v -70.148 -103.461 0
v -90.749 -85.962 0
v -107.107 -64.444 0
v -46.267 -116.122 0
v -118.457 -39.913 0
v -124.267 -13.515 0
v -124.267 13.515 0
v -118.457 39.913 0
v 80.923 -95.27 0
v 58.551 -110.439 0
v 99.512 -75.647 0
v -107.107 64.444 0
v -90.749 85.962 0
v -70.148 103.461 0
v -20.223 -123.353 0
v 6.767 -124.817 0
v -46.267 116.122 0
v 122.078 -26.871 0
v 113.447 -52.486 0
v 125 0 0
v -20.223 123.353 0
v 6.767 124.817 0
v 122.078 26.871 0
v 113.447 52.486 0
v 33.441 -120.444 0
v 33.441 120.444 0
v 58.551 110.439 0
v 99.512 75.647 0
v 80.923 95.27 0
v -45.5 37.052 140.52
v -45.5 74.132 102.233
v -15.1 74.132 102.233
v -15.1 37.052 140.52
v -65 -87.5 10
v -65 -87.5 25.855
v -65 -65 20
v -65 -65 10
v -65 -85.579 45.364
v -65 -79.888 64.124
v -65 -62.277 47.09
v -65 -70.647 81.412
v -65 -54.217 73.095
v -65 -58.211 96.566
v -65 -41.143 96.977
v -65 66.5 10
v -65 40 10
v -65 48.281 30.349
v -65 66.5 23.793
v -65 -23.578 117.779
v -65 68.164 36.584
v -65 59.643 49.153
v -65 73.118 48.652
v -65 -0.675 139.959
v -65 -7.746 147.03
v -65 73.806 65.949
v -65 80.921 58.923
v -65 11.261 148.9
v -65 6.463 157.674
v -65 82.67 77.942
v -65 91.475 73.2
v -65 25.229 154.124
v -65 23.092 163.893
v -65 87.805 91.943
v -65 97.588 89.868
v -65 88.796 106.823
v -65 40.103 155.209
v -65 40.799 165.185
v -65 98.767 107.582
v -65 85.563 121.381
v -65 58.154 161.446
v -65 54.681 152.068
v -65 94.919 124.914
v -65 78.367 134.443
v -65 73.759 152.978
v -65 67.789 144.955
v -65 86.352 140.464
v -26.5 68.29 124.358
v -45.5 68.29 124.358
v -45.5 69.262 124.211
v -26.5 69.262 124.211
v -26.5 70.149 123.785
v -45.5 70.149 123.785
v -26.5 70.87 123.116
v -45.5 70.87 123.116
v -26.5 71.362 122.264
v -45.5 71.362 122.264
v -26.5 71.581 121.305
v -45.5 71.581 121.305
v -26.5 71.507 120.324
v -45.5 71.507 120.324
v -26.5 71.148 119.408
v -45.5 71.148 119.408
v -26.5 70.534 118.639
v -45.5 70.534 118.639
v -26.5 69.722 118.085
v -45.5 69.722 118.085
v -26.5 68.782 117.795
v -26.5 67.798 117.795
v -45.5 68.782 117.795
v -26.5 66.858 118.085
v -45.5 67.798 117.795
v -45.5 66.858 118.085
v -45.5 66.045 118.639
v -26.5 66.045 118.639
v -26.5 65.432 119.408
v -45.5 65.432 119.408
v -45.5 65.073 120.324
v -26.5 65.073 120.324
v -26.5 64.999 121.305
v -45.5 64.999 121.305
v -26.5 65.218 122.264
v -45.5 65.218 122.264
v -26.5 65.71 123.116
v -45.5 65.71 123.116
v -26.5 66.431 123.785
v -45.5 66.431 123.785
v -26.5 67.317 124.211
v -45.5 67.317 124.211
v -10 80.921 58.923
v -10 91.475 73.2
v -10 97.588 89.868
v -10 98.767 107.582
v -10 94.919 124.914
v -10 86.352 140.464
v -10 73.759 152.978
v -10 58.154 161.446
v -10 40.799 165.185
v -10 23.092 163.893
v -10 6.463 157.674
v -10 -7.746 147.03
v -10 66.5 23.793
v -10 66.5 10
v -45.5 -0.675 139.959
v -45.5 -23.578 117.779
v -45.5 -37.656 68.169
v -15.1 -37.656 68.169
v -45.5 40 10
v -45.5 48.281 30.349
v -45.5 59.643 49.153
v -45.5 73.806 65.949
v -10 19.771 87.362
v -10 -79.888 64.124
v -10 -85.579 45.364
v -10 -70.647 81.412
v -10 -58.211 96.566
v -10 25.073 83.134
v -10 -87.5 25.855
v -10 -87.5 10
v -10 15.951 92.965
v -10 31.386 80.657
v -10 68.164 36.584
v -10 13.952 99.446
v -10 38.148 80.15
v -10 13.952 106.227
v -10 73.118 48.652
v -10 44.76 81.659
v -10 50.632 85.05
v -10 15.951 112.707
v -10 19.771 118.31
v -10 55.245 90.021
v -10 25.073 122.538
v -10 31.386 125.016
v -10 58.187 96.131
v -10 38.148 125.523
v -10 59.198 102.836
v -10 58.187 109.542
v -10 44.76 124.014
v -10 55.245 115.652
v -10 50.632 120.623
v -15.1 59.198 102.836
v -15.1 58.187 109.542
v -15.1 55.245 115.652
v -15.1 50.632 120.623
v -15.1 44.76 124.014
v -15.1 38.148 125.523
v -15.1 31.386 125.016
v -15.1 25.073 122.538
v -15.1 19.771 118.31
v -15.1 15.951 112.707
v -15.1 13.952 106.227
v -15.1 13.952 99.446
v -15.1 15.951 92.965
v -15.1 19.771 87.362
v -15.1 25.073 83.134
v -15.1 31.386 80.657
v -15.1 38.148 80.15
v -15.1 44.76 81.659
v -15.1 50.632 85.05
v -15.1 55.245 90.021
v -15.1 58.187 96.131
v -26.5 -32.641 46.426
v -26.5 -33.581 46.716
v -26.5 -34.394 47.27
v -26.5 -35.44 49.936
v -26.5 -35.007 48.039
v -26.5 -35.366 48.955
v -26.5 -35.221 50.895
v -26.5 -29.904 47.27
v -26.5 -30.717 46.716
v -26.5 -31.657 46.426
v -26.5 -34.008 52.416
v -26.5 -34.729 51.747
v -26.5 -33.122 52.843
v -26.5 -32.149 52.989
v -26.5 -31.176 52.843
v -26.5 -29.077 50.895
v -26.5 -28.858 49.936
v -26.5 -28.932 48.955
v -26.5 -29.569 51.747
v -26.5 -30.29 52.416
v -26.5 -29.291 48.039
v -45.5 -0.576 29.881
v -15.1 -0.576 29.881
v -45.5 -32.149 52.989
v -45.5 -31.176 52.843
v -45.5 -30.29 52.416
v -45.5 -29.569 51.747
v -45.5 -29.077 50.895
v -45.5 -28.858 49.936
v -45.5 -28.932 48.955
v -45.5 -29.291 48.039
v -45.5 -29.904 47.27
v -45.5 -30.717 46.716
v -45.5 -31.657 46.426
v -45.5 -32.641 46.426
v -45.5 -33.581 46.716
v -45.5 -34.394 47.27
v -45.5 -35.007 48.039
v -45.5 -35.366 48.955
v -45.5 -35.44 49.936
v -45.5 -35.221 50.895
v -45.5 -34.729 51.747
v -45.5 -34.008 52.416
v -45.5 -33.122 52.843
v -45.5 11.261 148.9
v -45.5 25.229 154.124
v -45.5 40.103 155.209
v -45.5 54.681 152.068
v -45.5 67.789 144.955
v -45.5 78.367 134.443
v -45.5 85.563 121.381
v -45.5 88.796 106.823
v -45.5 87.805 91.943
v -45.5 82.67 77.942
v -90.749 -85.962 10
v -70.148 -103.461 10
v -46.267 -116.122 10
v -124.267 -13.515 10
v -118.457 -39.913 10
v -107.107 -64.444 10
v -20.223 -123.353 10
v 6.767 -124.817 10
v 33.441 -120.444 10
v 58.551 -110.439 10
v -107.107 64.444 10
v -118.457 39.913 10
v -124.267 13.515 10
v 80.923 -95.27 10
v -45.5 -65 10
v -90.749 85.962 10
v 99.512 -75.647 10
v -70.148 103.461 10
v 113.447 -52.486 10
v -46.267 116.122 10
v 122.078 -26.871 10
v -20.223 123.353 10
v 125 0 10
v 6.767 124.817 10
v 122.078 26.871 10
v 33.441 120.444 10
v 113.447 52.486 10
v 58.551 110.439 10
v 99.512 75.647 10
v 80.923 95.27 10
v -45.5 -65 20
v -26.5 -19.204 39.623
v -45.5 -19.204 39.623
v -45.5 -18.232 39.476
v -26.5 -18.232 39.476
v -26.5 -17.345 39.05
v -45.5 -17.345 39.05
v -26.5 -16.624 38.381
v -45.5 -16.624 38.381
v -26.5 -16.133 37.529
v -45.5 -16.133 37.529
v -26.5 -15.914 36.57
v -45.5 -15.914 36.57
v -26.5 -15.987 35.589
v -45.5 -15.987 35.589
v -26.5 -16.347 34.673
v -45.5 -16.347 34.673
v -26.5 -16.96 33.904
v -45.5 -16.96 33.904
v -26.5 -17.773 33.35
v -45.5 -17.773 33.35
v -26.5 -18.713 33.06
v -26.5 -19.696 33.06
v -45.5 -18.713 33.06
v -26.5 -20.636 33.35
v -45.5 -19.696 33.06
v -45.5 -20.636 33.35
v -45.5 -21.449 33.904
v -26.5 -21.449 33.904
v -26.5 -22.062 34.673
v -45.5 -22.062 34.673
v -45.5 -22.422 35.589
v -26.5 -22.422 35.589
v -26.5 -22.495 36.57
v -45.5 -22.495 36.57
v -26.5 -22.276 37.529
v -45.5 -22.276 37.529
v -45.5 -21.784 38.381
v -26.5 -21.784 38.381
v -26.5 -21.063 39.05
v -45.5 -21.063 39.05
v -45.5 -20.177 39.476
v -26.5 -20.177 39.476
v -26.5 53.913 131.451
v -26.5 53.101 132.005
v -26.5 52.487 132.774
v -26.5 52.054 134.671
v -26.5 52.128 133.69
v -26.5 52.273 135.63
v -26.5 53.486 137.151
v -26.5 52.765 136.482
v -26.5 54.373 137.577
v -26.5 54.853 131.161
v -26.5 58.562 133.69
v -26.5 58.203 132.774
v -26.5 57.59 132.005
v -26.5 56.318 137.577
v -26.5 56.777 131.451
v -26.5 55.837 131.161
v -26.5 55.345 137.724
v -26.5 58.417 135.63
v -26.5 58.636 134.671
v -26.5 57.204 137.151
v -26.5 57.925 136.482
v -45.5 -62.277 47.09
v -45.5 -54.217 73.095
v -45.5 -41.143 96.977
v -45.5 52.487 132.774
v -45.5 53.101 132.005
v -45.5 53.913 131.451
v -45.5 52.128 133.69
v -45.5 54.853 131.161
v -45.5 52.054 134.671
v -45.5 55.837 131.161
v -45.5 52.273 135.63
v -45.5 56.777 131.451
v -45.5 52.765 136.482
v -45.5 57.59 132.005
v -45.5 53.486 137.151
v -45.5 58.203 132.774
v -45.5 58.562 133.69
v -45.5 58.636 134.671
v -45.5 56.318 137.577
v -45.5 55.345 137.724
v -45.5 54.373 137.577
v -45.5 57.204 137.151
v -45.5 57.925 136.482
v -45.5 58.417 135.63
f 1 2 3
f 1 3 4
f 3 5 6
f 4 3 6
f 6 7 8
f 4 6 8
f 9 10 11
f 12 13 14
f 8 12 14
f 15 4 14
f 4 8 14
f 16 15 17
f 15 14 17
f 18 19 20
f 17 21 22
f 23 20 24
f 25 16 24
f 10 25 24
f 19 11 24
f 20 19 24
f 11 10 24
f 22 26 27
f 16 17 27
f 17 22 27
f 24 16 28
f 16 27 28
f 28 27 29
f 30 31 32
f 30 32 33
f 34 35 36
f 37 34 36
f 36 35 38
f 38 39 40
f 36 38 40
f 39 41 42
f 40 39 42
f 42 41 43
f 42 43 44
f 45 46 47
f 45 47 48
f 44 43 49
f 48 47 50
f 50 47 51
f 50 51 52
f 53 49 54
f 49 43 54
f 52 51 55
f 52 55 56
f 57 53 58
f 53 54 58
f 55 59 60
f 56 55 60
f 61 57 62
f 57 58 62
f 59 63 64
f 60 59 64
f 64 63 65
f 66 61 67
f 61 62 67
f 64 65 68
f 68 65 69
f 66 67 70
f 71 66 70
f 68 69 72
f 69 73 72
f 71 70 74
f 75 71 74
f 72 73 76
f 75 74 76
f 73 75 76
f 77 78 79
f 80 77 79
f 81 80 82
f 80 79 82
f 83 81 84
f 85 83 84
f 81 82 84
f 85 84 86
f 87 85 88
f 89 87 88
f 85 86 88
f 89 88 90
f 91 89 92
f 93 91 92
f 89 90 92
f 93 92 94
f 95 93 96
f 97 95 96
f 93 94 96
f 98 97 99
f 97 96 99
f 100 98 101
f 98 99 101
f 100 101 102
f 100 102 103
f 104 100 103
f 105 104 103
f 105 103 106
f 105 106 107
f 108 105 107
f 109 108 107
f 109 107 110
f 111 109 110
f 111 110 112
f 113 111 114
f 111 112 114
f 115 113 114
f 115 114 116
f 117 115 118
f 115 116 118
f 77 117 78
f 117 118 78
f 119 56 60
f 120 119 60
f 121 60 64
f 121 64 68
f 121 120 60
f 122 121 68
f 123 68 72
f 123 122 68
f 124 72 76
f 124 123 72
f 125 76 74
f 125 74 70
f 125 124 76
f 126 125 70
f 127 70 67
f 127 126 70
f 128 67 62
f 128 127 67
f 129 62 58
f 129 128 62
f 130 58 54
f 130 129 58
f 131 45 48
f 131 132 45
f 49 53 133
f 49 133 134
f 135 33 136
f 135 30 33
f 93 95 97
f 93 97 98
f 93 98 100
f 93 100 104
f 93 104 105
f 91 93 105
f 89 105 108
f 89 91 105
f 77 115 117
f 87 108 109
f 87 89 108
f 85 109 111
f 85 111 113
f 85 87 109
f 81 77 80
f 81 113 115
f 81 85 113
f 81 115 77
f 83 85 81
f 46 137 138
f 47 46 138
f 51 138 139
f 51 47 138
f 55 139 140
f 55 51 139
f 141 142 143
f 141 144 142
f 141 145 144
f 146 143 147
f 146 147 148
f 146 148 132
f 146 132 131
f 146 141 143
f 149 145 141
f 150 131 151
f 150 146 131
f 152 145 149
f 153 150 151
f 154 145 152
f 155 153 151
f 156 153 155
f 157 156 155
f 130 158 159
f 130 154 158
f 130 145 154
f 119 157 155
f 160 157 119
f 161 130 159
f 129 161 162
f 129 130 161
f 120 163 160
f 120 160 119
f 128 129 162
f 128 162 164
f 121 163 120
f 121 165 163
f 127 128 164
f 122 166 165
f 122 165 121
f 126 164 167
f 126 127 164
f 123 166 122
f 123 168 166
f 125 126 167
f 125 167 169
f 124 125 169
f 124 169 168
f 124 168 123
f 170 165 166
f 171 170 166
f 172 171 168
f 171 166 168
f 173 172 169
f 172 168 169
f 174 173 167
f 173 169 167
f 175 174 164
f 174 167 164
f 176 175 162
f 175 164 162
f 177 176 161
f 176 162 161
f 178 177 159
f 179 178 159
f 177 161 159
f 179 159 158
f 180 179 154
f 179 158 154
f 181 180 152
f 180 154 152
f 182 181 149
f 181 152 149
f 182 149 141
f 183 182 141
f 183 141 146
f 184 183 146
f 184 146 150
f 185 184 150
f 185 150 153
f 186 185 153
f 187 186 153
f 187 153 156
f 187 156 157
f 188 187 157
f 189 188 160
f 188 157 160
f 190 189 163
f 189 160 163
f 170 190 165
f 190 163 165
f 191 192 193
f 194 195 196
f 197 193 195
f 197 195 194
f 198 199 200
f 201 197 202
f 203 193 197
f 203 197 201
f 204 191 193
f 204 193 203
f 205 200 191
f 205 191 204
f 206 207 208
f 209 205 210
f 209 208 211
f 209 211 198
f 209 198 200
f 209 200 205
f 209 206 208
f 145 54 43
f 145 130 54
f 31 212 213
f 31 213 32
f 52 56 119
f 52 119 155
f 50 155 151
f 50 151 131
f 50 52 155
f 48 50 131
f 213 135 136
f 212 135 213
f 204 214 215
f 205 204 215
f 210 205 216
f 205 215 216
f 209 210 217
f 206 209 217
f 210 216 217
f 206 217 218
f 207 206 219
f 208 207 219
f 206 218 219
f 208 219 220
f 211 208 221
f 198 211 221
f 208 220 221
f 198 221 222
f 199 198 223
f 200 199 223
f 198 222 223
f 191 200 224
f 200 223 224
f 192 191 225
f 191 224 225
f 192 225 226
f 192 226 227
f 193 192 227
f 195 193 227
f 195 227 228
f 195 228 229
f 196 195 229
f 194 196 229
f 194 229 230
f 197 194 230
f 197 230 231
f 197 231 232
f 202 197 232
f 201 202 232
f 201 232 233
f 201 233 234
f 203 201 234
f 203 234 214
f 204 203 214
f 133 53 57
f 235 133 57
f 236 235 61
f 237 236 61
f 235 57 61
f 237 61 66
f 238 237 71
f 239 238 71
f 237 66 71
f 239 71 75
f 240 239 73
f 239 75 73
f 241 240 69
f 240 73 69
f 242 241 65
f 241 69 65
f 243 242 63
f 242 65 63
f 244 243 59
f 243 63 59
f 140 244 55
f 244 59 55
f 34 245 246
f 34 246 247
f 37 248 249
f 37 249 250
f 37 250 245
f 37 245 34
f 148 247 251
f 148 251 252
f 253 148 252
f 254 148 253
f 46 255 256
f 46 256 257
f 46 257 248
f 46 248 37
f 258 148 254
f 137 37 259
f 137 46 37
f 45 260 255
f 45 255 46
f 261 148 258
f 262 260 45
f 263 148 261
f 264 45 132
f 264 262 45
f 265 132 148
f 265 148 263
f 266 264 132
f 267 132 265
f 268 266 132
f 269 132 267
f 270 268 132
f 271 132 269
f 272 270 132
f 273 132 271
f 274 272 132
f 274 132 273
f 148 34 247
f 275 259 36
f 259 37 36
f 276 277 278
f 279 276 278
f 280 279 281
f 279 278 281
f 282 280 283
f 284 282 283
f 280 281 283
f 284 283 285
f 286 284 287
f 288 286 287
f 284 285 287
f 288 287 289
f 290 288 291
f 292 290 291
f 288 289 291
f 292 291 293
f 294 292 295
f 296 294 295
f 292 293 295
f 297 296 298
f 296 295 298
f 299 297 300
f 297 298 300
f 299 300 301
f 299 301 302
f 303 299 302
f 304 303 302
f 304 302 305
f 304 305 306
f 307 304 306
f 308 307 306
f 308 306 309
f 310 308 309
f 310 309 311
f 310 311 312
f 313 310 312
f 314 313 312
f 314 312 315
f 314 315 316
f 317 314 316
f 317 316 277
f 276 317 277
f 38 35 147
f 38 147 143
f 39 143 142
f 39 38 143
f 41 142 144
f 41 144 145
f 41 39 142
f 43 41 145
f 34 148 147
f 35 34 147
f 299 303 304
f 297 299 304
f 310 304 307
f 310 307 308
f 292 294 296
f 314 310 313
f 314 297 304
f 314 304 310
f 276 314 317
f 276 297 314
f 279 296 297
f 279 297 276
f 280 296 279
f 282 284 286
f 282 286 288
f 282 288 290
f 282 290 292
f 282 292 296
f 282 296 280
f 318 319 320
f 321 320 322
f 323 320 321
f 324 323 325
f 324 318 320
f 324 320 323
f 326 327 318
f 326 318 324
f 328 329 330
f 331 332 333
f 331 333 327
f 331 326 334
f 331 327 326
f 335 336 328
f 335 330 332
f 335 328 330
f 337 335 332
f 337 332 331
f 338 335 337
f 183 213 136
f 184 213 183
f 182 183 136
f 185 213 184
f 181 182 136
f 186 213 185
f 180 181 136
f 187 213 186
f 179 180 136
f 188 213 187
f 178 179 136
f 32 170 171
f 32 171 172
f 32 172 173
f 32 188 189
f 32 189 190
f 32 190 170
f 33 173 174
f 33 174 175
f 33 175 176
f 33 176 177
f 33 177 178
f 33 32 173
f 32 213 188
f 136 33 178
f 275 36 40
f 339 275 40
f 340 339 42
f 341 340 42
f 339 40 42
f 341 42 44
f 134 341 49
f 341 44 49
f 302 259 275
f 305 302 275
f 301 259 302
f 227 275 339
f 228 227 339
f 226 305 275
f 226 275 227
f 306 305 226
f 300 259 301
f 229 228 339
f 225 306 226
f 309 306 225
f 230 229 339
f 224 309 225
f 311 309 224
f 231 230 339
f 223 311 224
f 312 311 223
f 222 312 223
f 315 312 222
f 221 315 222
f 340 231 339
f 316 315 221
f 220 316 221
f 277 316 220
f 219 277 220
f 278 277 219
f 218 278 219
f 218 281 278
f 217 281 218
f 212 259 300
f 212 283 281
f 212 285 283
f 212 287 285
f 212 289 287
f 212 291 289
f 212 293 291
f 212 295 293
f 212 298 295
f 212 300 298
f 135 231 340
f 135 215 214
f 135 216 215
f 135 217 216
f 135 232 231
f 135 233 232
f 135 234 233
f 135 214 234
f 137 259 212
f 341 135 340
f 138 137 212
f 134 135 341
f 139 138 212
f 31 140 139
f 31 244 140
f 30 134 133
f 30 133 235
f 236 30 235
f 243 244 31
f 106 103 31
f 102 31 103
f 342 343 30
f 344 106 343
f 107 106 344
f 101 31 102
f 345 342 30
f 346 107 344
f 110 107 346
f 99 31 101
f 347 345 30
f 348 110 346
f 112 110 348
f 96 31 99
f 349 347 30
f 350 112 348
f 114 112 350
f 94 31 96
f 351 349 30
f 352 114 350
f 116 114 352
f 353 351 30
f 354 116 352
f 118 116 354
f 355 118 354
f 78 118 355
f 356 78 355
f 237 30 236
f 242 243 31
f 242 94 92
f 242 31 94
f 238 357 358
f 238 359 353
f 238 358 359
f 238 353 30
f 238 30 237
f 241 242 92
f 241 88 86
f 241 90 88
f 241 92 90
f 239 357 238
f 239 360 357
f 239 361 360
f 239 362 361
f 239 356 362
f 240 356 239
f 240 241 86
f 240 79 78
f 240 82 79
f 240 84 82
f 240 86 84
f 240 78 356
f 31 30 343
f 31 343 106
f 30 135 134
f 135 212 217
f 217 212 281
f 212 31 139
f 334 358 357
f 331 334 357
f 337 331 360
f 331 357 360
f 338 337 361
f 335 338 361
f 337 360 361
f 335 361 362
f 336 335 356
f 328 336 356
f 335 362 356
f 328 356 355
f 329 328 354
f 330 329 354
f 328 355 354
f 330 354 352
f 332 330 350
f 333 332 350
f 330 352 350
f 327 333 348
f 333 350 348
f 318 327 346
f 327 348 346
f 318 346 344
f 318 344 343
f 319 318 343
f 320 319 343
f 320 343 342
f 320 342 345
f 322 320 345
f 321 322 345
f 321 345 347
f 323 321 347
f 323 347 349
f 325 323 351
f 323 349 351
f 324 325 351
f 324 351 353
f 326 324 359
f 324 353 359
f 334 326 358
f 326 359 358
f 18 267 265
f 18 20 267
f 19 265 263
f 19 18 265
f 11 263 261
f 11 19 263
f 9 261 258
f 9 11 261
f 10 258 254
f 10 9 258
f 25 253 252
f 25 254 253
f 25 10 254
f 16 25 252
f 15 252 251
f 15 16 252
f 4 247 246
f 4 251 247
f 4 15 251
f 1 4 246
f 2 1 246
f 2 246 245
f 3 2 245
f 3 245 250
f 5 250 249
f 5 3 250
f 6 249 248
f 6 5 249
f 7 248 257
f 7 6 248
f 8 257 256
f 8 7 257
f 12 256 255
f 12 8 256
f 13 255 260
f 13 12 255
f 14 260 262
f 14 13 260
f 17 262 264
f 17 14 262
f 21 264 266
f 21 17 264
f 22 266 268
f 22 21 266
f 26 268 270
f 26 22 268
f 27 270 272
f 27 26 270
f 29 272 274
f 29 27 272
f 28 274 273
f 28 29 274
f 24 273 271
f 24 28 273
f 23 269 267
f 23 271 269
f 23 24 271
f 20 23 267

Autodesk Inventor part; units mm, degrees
ref_plane "XZ Plane" through (0, 0, 0) normal (0, 1, 0) x (-1, 0, 0)
ref_plane "XY Plane" through (0, 0, 0) normal (0, 0, 1) x (1, 0, 0)
sketch "Sketch1" plane through (0, 0, 0) normal (0, 0, 1) x (1, 0, 0)
  circle A0 centre (0, 0) radius 125
  dimension "d0" = 250
extrude "Extrusion1" add sketch "Sketch1" along normal blind 10
ref_plane "Work Plane1" through (-10, 0, 0) normal (1, 0, 0) x (0, 1, 0)
sketch "Sketch2" plane through (-10, 0, 0) normal (1, 0, 0) x (0, 1, 0)
  line L0 (0, 0) -> (0, 156.8689) construction
  line L1 (125, 10) -> (-125, 10) projected
  line L2 (0, 10) -> (-87.5, 10)
  line L3 (-87.5, 10) -> (-87.5, 67.2767)
  line L4 (0, 10) -> (66.5, 10)
  line L5 (66.5, 10) -> (66.5, 44.5)
  line L6 (66.5, 44.5) -> (80.6421, 58.6421)
  line L7 (66.5, 44.5) -> (86.5, 44.5) construction
  line L8 (80.6421, 58.6421) -> (-7.7462, 147.0305) construction
  arc A0 (80.6421, 58.6421) -> (-7.7462, 147.0305) centre (36.448, 102.8363) ccw
  line L9 (-7.7462, 147.0305) -> (-87.5, 67.2767)
  line L10 (-7.7462, 147.0305) -> (127.2538, 147.0305) construction
  circle A1 centre (36.448, 102.8363) radius 22.75
  dimension "d4" = 87.5
  dimension "d6" = 66.5
  dimension "d7" = 34.5
  dimension "d8" = 20
  dimension "d9" = 45
  dimension "d10" = 125
  dimension "d11" = 135
  dimension "d12" = 45.5
extrude "Extrusion2" add sketch "Sketch2" against normal blind 55
fillet "Fillet1" radius 100 1 edges at (-37.5, -87.5, 67.2767)
fillet "Fillet2" radius 50 1 edges at (-37.5, 66.5, 44.5)
sketch "Sketch3" plane through (-65, 0, 0) normal (-1, 0, 0) x (0, 0, 1)
  line L0 (25.8553, -87.5) -> (10, -87.5) projected
  line L1 (10, -87.5) -> (25.8553, -87.5)
  arc A0 (25.8553, -87.5) -> (96.566, -58.2107) centre (25.8553, 12.5) ccw projected
  arc A1 (25.8553, -87.5) -> (96.566, -58.2107) centre (25.8553, 12.5) ccw
  line L2 (96.566, -58.2107) -> (147.0305, -7.7462) projected
  line L3 (96.566, -58.2107) -> (147.0305, -7.7462)
  arc A2 (147.0305, -7.7462) -> (58.6421, 80.6421) centre (102.8363, 36.448) ccw projected
  arc A3 (147.0305, -7.7462) -> (58.9231, 80.9213) centre (102.8363, 36.448) ccw
  arc A4 (23.7925, 66.5) -> (58.9231, 80.9213) centre (23.7925, 116.5) ccw projected
  arc A5 (23.7925, 66.5) -> (58.9231, 80.9213) centre (23.7925, 116.5) ccw
  line L4 (44.5, 66.5) -> (10, 66.5) projected
  line L5 (23.7925, 66.5) -> (10, 66.5)
  line L6 (10, 66.5) -> (10, -87.5)
  arc A6 (139.9594, -0.6751) -> (65.9492, 73.8056) centre (102.8363, 36.448) ccw
  line L7 (139.9594, -0.6751) -> (117.7788, -23.5781)
  line L8 (0, 0) -> (182.0155, 0) construction
  line L9 (0, -125) -> (0, 125) construction
  line L10 (10, 0) -> (10, -65) construction
  line L11 (10, -65) -> (20, -65)
  arc A7 (20, -65) -> (117.7788, -23.5781) centre (20, 71.1171) ccw
  line L12 (10, 0) -> (10, 40) construction
  arc A8 (10, 40) -> (65.9492, 73.8056) centre (-32.4537, 173.4637) ccw
  dimension "d16" = 10
  dimension "d17" = 65
  dimension "d18" = 10
  dimension "d19" = 40
extrude "Extrusion3" cut sketch "Sketch3" against normal blind 19.5 contours L6 A8 A6 L7 A7 L11
sketch "Sketch4" plane through (-45.5, 0, 0) normal (-1, 0, 0) x (0, 0, 1)
  line L0 (143.3452, 39.9686) -> (60.7799, -45.2853) construction
  line L1 (139.9594, -0.6751) -> (117.7788, -23.5781) construction
  circle A0 centre (102.8363, 36.448) radius 22.75 construction
  line L2 (102.2737, 74.1744) -> (28.4952, -2.0066) construction
  line L3 (100.9974, 75.3281) -> (145.8599, 31.8805) construction
  line L4 (22.9611, 6.1258) -> (80.8137, -49.9023) construction
  line L5 (140.5203, 37.0517) -> (68.1686, -37.656)
  line L6 (68.1686, -37.656) -> (29.8809, -0.5758)
  line L7 (29.8809, -0.5758) -> (102.2326, 74.1319)
  line L8 (102.2326, 74.1319) -> (140.5203, 37.0517)
  point P0 (0, 0)
  dimension "d24" = 26.65
  dimension "d25" = 26.65
  dimension "d26" = 26.65
  dimension "d27" = 104
extrude "Extrusion4" cut sketch "Sketch4" against normal blind 30.4
sketch "Sketch5" plane through (-45.5, 0, 0) normal (-1, 0, 0) x (0, 0, 1)
  line L0 (147.2746, 42.9) -> (108.2076, 80.7349) construction
  line L1 (102.2326, 74.1319) -> (140.5203, 37.0517) construction
  circle A0 centre (134.4241, 55.3452) radius 3.3
  circle A1 centre (121.0581, 68.2898) radius 3.3
  line L2 (121.3764, 55.5918) -> (127.7411, 61.8175) construction
  line L3 (140.5203, 37.0517) -> (68.1686, -37.656) construction
  line L4 (104.3444, -0.3021) -> (66.0567, 36.7781) construction
  line L5 (29.8809, -0.5758) -> (102.2326, 74.1319) construction
  circle A2 centre (49.6892, -32.149) radius 3.3
  circle A3 centre (36.3231, -19.2044) radius 3.3
  point P0 (0, 0)
  dimension "d30" = 8.9
  dimension "d31" = 6.6
  dimension "d32" = 6.6
  dimension "d33" = 9.3
  dimension "d34" = 9.3
extrude "Extrusion5" cut sketch "Sketch5" against normal blind 19
properties part number "Final Waist"
